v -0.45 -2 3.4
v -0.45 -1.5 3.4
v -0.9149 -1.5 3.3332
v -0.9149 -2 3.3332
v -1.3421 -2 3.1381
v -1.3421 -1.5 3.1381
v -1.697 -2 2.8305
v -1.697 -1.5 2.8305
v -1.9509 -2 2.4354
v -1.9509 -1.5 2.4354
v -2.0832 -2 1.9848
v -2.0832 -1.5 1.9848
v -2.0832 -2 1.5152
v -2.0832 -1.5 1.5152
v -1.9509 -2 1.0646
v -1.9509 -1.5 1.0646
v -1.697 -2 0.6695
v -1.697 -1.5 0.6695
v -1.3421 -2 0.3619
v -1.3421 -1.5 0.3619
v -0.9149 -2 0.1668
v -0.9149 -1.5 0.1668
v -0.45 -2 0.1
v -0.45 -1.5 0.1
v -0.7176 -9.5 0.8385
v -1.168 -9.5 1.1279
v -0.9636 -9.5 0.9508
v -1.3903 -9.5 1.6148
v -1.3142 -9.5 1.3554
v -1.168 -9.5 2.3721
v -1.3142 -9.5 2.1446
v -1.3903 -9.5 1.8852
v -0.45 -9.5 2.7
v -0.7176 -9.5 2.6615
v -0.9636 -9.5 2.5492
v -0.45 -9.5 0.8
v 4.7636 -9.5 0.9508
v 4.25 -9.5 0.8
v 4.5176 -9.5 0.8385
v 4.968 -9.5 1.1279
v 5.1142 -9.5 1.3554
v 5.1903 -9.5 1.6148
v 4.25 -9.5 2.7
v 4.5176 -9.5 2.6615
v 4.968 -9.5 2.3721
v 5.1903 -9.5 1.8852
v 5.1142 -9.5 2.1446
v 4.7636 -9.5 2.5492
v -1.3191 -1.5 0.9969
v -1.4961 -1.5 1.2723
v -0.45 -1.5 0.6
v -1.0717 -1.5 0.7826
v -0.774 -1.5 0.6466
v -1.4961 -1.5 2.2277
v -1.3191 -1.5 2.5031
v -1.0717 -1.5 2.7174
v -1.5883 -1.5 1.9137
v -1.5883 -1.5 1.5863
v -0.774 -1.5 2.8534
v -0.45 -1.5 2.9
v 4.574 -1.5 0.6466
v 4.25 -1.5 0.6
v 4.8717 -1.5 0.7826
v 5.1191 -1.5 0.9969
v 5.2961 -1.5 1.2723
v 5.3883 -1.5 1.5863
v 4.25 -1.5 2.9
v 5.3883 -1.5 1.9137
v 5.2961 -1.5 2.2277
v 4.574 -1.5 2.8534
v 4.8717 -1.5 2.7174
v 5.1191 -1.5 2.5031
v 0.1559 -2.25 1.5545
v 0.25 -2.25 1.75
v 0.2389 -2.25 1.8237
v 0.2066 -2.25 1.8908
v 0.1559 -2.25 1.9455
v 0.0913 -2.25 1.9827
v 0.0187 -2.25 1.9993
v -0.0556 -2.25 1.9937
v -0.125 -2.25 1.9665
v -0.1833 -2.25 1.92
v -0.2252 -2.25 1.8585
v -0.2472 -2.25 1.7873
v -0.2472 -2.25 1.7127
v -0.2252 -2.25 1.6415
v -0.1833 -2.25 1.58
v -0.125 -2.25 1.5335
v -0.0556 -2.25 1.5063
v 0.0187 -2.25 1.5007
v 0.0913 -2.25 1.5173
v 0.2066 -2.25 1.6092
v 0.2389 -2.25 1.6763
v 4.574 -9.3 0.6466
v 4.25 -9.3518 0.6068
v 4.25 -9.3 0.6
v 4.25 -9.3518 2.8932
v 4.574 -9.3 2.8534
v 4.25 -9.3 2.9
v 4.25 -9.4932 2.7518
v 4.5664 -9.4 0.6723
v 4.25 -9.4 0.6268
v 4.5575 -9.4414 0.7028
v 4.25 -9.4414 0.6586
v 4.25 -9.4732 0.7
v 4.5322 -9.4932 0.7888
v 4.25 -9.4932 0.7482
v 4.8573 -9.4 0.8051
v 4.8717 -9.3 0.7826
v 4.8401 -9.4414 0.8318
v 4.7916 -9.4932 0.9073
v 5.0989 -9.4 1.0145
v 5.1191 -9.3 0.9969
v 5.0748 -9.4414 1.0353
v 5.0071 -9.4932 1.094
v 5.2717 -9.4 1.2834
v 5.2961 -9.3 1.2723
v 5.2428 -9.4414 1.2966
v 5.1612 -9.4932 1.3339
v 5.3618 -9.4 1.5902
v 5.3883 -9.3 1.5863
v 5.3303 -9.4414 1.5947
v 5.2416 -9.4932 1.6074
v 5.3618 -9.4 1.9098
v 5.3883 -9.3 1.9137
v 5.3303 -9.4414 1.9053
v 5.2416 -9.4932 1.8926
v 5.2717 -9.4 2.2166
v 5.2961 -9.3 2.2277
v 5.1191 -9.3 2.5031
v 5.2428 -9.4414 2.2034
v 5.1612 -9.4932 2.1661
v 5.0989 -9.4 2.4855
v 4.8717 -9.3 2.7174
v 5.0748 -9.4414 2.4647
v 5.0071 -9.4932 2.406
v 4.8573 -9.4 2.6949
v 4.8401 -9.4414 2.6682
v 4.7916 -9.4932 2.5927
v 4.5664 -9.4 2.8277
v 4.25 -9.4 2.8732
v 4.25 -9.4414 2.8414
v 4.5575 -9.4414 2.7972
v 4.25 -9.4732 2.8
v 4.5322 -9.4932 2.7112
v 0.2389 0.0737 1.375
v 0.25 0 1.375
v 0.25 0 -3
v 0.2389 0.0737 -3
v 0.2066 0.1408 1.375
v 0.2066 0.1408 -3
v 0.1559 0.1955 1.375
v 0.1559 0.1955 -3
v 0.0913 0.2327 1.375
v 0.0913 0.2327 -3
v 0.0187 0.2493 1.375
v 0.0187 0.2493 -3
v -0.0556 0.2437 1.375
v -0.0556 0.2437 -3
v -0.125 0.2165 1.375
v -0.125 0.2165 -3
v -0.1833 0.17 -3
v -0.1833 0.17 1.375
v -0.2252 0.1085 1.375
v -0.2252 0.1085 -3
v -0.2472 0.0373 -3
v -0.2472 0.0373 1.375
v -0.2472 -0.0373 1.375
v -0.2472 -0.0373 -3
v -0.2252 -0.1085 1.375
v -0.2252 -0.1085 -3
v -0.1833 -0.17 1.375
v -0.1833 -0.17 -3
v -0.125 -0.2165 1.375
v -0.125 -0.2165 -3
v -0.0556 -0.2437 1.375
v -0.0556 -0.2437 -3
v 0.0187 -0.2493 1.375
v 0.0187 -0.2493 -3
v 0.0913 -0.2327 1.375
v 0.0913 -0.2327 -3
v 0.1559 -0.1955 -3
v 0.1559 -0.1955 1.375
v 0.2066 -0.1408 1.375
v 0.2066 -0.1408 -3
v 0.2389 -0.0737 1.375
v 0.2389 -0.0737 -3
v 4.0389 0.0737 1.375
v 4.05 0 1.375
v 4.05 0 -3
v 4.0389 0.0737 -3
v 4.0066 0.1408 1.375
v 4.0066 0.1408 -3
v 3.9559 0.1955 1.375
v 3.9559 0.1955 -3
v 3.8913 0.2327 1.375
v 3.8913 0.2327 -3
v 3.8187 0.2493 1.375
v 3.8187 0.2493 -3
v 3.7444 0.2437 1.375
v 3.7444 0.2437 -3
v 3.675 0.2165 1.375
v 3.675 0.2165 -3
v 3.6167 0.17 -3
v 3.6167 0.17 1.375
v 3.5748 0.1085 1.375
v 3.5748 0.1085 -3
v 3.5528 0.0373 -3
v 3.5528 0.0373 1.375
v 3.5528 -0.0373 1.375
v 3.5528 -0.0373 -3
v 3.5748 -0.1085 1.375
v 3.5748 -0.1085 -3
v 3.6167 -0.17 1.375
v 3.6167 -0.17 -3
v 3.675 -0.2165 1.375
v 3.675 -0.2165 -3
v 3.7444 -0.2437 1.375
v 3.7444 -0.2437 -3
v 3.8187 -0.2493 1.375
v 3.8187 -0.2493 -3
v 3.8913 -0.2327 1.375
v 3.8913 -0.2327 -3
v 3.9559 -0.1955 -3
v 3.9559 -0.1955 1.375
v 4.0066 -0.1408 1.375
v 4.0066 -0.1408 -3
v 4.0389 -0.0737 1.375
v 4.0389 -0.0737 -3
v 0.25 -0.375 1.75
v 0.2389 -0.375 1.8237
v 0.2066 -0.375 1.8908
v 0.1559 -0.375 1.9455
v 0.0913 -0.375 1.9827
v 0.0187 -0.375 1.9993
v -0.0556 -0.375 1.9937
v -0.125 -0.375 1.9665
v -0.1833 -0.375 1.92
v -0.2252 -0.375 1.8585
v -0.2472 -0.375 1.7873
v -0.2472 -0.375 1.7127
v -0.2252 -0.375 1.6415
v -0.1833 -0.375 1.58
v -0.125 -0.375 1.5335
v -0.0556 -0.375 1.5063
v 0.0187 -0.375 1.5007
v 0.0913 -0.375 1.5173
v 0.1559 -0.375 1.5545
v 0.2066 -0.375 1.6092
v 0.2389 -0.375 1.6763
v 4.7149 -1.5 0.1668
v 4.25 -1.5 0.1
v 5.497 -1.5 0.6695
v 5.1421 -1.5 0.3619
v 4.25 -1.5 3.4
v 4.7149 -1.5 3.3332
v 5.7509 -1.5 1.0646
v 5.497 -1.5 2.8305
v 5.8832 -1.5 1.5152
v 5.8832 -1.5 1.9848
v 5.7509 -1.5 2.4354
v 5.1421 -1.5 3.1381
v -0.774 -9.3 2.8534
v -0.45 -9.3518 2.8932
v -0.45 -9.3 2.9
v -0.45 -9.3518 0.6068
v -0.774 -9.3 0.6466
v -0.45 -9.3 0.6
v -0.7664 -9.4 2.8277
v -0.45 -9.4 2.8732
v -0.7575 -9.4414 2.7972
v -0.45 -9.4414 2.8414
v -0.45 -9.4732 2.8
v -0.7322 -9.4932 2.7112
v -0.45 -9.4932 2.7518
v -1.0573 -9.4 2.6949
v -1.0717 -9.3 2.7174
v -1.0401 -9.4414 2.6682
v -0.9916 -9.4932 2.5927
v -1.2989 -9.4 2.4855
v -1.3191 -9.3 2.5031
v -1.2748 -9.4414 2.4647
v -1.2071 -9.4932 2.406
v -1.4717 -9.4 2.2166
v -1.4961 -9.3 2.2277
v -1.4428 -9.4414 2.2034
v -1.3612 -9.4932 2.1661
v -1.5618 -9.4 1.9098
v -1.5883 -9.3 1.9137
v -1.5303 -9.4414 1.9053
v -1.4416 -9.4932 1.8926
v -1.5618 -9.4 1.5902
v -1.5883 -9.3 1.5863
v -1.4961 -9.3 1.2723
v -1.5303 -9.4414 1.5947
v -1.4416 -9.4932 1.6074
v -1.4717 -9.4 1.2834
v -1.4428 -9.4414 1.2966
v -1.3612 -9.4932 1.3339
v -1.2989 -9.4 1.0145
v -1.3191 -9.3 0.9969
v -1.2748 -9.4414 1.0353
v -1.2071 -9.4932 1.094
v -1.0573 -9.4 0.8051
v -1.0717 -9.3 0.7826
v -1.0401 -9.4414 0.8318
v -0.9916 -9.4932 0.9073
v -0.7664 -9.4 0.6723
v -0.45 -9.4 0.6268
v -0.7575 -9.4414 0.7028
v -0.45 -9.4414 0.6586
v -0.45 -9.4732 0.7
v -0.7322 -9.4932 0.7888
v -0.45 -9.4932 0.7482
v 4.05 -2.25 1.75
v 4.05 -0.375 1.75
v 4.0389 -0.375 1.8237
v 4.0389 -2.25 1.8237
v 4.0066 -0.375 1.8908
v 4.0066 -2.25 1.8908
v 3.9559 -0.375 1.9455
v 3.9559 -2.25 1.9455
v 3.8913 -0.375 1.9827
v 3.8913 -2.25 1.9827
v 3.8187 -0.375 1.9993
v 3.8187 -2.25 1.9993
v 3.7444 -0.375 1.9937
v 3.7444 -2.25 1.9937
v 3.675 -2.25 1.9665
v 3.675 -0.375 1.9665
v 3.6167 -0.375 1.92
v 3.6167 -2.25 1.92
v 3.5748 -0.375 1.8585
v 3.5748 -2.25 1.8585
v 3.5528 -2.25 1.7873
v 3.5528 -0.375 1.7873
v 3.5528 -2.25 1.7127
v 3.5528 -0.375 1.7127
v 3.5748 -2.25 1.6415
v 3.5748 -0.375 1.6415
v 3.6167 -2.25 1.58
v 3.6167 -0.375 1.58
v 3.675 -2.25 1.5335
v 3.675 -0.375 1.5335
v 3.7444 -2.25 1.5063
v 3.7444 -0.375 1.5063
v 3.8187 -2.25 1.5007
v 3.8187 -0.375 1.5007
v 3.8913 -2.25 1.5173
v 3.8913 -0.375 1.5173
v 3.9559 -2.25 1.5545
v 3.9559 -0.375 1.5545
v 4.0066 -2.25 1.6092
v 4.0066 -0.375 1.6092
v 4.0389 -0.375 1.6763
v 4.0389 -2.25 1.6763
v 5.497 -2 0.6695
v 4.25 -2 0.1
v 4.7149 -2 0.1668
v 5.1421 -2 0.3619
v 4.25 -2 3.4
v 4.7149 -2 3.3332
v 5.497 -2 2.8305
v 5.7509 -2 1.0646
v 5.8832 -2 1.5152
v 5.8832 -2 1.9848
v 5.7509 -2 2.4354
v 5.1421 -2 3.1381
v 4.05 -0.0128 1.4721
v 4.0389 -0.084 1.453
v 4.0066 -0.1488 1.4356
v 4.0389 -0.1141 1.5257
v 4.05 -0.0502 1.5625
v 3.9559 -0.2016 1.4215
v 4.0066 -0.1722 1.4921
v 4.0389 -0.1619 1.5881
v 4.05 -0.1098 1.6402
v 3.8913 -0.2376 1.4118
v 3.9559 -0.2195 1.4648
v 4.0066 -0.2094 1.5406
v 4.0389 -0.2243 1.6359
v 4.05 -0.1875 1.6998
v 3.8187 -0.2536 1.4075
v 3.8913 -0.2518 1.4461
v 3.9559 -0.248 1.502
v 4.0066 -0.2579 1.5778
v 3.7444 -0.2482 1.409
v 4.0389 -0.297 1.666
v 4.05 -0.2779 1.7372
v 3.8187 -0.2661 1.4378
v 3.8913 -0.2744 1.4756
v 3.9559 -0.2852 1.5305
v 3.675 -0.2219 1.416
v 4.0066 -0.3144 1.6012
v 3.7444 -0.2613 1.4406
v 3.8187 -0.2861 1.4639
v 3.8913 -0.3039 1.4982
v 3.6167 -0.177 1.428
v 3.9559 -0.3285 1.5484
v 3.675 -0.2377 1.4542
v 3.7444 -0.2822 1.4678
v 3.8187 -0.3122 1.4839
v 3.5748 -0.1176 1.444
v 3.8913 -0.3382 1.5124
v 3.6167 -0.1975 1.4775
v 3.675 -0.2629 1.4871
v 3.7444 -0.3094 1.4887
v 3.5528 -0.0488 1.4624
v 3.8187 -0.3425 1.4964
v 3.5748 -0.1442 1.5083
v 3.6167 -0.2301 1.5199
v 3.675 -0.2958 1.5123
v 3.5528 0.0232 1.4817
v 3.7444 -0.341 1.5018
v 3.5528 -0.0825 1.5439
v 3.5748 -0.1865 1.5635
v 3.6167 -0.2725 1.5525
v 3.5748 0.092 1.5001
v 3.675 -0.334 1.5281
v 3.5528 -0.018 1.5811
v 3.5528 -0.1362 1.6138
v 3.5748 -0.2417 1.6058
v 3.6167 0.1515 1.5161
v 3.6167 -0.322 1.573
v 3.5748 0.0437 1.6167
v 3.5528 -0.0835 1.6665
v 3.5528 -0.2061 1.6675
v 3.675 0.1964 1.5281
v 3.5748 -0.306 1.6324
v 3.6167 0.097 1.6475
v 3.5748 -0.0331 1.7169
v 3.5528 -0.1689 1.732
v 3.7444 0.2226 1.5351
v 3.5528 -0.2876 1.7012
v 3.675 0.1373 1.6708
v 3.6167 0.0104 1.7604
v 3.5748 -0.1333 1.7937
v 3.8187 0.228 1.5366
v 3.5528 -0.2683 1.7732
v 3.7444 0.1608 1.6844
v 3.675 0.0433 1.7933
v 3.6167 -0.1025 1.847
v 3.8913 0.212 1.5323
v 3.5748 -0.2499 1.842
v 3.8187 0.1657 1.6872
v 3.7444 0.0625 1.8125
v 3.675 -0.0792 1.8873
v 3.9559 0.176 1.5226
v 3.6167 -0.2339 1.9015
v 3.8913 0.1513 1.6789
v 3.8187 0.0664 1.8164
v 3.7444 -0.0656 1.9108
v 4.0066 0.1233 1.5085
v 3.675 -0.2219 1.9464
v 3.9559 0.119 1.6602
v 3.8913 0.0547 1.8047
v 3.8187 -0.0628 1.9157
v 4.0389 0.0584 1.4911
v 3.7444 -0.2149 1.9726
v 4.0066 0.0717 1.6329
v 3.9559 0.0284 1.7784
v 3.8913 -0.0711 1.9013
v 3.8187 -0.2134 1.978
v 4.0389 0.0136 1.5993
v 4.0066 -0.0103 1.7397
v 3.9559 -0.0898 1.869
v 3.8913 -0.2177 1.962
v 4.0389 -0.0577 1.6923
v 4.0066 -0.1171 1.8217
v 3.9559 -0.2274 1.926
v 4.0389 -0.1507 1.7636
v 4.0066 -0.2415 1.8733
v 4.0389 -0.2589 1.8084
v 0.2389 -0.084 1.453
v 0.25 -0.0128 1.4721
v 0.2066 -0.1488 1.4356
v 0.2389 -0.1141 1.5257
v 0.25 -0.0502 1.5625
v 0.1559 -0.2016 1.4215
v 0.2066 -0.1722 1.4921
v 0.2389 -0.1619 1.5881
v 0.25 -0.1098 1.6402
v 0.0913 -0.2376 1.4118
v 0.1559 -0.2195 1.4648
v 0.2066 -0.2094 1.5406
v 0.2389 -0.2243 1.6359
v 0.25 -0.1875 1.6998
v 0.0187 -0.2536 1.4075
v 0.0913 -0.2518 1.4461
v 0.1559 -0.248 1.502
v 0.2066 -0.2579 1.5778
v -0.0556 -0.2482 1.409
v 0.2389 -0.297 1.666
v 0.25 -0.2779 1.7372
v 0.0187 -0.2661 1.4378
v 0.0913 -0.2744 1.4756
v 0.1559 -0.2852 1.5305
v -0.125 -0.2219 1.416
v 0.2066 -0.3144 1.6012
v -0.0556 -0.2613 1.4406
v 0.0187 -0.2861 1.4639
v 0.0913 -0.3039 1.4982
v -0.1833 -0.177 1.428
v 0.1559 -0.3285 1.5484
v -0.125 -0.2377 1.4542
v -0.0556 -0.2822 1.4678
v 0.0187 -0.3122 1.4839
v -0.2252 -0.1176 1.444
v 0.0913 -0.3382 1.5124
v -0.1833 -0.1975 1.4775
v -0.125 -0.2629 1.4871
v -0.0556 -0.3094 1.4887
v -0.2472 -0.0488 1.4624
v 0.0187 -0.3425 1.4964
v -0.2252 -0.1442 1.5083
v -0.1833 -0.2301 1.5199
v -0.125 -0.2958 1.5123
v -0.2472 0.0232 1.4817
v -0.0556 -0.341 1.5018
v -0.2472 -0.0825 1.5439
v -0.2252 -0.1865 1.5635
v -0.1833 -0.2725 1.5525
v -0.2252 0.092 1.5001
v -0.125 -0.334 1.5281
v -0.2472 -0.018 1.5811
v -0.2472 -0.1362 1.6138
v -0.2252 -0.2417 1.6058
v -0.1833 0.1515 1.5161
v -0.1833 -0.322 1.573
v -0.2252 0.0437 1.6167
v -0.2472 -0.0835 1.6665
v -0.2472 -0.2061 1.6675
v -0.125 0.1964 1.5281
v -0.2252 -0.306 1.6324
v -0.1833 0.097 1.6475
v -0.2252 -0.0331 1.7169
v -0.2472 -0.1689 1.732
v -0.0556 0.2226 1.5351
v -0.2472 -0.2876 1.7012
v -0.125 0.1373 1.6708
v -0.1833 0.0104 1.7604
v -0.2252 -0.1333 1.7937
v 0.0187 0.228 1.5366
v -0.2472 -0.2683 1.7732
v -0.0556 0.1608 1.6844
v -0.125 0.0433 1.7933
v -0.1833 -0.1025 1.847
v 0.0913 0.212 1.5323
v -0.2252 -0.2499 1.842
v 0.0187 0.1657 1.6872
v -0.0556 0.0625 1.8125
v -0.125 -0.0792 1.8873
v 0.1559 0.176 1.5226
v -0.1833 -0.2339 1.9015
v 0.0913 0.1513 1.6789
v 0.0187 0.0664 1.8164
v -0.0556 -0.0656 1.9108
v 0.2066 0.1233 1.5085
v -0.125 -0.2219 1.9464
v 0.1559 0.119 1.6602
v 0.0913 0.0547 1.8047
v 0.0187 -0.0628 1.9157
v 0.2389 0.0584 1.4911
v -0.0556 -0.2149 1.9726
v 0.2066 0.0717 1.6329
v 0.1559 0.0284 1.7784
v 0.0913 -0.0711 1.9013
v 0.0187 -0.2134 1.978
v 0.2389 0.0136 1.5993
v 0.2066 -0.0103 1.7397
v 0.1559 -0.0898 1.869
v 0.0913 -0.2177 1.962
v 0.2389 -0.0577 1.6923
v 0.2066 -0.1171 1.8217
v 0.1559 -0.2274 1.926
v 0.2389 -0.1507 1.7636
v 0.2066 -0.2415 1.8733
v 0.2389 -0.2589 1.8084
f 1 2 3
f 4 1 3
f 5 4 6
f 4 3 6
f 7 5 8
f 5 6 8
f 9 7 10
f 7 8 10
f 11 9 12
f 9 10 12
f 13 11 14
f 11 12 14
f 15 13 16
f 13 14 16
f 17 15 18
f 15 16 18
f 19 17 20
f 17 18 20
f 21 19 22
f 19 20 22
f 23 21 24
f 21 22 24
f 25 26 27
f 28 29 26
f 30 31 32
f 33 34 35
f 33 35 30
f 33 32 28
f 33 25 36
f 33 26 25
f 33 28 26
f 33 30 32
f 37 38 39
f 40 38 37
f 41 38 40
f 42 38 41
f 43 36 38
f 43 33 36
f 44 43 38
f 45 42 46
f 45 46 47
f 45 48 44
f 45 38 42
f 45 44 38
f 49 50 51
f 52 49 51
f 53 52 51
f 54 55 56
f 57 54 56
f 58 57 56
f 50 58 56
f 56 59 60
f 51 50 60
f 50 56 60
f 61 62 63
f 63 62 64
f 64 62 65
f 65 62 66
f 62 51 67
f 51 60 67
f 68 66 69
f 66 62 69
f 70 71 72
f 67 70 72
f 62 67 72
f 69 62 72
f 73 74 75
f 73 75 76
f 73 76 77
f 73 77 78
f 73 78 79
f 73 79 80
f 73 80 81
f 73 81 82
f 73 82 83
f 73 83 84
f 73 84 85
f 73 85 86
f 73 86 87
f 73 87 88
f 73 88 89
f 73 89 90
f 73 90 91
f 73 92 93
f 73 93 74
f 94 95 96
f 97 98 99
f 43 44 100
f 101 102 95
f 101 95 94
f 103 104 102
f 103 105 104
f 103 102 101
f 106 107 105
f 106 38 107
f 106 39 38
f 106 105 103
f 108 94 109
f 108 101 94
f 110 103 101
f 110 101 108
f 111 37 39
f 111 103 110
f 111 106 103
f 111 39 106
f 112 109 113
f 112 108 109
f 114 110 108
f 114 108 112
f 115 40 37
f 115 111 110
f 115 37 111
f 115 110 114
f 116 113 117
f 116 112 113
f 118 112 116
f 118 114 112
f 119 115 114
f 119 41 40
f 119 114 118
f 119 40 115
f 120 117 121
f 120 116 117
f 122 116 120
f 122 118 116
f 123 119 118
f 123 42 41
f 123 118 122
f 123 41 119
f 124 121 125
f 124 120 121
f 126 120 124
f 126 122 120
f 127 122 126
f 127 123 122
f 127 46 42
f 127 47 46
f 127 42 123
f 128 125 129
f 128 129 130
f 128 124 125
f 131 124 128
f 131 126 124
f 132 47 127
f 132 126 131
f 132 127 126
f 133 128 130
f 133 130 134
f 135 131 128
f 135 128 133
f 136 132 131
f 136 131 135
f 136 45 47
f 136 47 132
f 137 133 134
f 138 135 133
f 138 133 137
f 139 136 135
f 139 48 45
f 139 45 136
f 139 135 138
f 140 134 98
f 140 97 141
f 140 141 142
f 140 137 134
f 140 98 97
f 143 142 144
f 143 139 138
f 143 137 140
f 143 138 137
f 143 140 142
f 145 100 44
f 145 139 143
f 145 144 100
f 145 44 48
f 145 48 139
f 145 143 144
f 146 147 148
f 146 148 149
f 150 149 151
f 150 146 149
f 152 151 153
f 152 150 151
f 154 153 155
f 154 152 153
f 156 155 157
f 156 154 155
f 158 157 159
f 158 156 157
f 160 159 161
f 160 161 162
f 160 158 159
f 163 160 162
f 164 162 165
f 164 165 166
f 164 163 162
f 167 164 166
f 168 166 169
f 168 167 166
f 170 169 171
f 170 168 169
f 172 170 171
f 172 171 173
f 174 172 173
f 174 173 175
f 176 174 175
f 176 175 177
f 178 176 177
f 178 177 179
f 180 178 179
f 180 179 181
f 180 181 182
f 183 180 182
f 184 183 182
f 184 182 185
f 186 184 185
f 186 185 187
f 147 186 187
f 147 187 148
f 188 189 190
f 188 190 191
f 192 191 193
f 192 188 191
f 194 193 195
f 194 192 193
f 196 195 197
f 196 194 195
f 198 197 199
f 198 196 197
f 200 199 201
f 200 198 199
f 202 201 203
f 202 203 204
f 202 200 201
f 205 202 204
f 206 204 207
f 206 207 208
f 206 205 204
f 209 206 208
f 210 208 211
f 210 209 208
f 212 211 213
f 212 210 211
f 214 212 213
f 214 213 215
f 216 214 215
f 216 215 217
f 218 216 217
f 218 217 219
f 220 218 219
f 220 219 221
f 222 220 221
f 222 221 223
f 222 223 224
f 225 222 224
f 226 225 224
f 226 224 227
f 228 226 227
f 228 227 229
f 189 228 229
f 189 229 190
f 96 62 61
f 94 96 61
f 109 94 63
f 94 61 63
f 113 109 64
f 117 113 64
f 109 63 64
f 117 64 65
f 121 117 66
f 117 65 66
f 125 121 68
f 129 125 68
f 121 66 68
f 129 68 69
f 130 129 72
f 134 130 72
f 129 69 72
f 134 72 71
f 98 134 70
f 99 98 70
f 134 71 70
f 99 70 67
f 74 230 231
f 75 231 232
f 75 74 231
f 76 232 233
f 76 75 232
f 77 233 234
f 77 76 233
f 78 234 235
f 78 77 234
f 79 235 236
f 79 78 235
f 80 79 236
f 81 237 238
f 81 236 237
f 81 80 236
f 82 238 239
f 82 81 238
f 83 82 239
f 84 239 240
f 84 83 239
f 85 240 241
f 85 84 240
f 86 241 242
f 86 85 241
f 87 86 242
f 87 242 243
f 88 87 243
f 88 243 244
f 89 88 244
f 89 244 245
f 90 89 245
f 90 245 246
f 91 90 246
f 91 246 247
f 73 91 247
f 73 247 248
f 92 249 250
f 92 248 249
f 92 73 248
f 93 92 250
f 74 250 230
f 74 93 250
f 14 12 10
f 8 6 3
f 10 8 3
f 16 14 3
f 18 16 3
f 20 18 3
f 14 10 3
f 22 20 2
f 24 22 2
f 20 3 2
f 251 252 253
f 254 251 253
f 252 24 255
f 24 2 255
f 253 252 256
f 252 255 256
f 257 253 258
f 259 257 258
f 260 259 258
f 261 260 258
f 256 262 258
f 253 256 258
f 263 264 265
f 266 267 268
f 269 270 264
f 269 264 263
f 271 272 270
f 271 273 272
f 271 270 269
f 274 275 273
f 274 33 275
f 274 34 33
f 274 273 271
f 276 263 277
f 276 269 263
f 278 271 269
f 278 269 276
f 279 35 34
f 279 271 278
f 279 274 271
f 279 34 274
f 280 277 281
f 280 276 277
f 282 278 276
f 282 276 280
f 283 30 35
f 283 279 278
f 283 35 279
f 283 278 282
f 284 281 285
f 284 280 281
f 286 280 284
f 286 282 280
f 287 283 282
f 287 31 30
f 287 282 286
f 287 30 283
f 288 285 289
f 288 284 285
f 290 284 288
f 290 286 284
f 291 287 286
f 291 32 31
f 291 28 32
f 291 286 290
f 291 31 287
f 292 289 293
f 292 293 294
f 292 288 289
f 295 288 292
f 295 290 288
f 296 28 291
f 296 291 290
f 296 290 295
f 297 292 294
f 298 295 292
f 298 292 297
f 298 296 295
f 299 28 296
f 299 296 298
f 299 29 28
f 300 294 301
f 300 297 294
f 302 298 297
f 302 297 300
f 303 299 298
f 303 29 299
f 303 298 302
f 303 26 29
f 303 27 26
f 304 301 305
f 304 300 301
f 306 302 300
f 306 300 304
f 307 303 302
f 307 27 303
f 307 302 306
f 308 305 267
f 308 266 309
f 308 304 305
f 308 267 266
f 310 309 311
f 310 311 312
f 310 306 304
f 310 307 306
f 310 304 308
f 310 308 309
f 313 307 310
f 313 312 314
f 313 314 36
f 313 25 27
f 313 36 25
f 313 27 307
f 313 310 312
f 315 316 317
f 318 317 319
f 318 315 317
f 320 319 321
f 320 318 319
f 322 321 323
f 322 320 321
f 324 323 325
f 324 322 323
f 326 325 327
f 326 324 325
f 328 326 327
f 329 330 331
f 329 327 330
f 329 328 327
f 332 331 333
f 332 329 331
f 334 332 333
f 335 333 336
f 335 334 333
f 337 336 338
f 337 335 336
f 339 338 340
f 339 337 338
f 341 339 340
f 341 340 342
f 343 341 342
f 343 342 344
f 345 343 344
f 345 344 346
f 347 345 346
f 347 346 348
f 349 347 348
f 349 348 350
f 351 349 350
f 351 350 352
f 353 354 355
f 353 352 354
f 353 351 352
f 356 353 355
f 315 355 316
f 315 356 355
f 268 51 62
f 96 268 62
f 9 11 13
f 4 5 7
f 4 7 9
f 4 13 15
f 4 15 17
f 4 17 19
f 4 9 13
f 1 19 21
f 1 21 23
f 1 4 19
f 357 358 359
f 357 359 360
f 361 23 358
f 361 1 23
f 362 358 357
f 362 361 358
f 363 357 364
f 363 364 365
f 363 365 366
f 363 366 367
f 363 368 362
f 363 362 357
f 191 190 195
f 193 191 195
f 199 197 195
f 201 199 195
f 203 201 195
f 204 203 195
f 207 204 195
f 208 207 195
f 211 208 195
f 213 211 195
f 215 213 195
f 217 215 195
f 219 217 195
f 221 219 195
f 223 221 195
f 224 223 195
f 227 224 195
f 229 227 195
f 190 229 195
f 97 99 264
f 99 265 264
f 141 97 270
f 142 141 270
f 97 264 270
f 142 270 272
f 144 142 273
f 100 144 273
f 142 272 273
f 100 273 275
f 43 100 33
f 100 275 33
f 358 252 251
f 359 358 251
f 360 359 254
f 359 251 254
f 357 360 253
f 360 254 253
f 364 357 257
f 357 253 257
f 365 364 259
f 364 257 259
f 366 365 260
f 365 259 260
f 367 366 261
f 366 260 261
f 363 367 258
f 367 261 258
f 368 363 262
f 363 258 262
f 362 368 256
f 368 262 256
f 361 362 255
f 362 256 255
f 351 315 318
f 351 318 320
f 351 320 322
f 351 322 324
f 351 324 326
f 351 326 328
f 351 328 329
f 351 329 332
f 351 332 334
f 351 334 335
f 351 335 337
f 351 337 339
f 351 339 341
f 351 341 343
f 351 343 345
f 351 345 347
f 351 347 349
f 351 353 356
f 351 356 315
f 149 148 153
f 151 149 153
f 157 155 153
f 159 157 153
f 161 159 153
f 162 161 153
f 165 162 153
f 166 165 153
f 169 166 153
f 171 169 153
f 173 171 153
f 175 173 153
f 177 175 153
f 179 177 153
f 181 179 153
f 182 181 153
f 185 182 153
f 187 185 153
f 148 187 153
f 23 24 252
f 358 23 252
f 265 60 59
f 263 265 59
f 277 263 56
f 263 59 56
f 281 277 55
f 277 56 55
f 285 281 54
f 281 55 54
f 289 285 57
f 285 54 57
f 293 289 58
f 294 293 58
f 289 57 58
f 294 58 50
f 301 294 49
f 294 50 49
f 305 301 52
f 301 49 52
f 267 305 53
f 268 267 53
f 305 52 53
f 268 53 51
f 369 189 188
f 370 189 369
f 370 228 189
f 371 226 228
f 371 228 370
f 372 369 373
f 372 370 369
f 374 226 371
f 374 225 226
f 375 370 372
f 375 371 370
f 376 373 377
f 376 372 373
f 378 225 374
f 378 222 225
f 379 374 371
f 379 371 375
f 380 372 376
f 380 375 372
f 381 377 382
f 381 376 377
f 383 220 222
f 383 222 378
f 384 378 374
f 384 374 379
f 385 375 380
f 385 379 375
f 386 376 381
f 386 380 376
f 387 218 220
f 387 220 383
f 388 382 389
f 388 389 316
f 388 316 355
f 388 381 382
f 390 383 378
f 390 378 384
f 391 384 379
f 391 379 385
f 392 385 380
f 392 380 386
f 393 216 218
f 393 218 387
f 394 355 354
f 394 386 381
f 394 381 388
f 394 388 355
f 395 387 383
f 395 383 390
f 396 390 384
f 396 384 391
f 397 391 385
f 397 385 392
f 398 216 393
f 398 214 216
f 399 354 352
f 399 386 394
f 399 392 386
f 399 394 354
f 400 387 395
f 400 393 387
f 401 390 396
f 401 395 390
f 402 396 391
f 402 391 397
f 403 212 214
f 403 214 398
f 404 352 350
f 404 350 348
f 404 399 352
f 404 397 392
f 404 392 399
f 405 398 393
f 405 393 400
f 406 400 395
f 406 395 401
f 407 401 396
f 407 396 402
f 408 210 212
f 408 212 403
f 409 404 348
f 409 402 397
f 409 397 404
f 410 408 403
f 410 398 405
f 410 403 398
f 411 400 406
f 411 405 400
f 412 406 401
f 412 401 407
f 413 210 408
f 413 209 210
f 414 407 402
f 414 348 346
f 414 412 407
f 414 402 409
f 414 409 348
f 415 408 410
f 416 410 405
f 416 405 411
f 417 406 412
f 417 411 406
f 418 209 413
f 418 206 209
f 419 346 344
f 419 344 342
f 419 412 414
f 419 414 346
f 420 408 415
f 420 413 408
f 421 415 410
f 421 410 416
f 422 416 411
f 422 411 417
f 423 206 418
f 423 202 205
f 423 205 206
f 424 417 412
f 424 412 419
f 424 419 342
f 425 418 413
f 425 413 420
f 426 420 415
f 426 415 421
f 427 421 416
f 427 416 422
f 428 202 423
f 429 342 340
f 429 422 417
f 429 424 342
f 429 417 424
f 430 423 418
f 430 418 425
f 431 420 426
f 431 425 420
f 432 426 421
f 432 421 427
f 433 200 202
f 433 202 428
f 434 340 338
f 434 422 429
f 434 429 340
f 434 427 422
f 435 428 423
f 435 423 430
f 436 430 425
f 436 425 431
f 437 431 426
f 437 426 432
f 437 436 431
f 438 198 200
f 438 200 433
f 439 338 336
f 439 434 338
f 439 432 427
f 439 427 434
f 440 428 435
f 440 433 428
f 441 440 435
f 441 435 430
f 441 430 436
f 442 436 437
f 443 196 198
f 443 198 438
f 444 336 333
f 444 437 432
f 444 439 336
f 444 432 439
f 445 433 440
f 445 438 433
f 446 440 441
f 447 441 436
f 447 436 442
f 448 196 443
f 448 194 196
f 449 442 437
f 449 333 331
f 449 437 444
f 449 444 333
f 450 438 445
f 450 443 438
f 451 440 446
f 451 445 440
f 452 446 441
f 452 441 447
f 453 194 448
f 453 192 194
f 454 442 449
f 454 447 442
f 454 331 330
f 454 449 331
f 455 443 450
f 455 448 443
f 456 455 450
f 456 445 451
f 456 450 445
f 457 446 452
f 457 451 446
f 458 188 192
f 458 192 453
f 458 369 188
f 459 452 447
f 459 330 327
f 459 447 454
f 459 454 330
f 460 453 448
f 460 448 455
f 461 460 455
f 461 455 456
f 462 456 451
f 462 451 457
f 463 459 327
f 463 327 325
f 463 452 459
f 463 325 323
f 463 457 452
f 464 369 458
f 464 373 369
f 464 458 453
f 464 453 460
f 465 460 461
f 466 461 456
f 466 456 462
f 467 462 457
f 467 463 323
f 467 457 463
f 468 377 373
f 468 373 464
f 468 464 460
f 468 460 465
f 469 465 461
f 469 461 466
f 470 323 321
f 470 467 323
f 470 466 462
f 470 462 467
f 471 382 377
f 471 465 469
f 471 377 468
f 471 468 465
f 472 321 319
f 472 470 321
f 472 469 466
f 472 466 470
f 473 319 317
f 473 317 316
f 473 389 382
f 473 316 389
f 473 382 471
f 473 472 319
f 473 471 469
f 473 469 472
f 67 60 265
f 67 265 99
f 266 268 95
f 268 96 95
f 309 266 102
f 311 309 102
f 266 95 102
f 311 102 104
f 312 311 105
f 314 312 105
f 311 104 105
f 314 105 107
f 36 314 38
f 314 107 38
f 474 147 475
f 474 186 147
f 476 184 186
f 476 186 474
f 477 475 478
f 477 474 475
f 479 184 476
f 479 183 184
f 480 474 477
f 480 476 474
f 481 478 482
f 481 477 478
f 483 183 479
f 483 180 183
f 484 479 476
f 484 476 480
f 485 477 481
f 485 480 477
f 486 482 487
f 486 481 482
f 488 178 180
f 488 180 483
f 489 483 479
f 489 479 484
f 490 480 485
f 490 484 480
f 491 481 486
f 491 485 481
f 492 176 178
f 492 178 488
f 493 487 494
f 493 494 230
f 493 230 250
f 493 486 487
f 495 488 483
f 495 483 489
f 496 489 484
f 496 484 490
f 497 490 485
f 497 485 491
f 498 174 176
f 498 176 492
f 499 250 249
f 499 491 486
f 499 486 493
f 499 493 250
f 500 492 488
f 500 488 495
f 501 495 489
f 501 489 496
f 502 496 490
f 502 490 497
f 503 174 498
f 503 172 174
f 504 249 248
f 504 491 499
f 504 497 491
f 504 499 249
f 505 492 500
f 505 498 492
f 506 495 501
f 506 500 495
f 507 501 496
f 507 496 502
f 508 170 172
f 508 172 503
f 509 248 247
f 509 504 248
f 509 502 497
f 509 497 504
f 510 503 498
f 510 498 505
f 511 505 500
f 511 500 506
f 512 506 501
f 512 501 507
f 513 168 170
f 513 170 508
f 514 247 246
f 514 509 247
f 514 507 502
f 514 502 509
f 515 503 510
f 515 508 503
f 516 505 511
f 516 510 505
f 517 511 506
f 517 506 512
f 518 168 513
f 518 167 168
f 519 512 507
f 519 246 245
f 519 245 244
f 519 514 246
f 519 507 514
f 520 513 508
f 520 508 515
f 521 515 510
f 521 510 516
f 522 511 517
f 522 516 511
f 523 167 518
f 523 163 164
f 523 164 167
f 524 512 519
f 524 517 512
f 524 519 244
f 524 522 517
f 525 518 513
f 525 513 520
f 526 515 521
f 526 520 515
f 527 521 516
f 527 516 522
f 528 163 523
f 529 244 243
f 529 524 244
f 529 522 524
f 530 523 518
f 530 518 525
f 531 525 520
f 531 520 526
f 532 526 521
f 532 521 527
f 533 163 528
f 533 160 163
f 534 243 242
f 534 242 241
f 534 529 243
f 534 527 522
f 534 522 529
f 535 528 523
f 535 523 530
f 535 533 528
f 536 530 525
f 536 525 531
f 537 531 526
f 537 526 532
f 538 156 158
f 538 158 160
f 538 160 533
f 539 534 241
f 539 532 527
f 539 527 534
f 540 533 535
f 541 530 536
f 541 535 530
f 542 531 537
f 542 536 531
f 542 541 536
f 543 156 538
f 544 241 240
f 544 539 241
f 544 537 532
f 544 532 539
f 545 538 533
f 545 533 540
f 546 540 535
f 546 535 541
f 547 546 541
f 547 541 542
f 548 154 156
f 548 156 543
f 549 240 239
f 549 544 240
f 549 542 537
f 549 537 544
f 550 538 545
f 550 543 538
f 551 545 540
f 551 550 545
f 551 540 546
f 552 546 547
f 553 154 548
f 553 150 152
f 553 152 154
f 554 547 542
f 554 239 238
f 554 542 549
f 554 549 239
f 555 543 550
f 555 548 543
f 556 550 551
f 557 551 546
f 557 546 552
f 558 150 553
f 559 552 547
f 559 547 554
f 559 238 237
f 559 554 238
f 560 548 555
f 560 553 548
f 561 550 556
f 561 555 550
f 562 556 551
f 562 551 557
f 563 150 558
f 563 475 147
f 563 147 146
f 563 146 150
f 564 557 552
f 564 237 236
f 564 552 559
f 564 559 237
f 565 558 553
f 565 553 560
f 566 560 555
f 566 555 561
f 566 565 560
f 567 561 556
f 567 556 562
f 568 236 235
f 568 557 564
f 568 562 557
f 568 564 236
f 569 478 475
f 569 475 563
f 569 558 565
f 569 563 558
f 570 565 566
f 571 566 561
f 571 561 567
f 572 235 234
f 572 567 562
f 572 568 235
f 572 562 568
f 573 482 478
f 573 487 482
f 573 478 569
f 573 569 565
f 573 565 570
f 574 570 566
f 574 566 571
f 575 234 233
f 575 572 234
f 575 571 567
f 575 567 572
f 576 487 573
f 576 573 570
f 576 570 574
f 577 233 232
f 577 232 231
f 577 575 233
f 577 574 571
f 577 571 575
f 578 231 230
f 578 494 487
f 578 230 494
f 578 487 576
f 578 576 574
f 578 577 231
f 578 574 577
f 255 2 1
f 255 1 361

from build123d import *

# Parameters (mm, degrees)
PAD_DEPTH    = 0.5
PAD001_DEPTH = 8
FILLET_R     = 0.2
SKETCH_R     = 0.25
SKETCH002_R  = 0.25


with BuildPart() as pad:
    # Sketch004 → Pad (new body)
    with BuildSketch(Plane.XZ.offset(1.5)):
        with BuildLine():
            ThreePointArc((-0.45, 3.4), (-2.1, 1.75), (-0.45, 0.1))
            Line((-0.45, 0.1), (4.25, 0.1))
            ThreePointArc((4.25, 0.1), (5.9, 1.75), (4.25, 3.4))
            Line((-0.45, 3.4), (4.25, 3.4))
        make_face()
    extrude(amount=PAD_DEPTH)


with BuildPart() as fillet_body:
    # Sketch005 → Pad001 (new body)
    with BuildSketch(Plane.XZ.offset(1.5)):
        with BuildLine():
            ThreePointArc((-0.45, 2.9), (-1.6, 1.75), (-0.45, 0.6))
            Line((-0.45, 0.6), (4.25, 0.6))
            ThreePointArc((4.25, 0.6), (5.4, 1.75), (4.25, 2.9))
            Line((-0.45, 2.9), (4.25, 2.9))
        make_face()
    extrude(amount=PAD001_DEPTH)

    # Fillet
    fillet_edges = [fillet_body.edges().sort_by_distance(p)[0] for p in [
        (1.9, -9.5, 0.6),
        (-1.6, -9.5, 1.75),
        (1.9, -9.5, 2.9),
        (5.4, -9.5, 1.75),
    ]]
    fillet(fillet_edges, radius=FILLET_R)


with BuildPart() as sweep_body:
    # Sweep: sweep along a path in Sketch001
    with BuildLine(Plane.YZ) as sweep_path:
        Line((0, -3), (0, 1.375))
        ThreePointArc((0, 1.375), (-0.109835, 1.640165), (-0.375, 1.75))
        Line((-0.375, 1.75), (-2.25, 1.75))
    # Sketch → Sweep (sweep)
    with BuildSketch(Plane.XY.offset(0.1)):
        Circle(SKETCH_R)
    sweep(path=sweep_path.line)


with BuildPart() as sweep001:
    # Sweep001: sweep along a path in Sketch001
    with BuildLine(Plane.YZ) as sweep001_path:
        Line((0, -3), (0, 1.375))
        ThreePointArc((0, 1.375), (-0.109835, 1.640165), (-0.375, 1.75))
        Line((-0.375, 1.75), (-2.25, 1.75))
    # Sketch002 → Sweep001 (sweep)
    with BuildSketch(Plane.XY.offset(0.1)):
        with Locations((3.8, 0)):
            Circle(SKETCH002_R)
    sweep(path=sweep001_path.line)


solid = Compound([pad.part, fillet_body.part, sweep_body.part, sweep001.part])
